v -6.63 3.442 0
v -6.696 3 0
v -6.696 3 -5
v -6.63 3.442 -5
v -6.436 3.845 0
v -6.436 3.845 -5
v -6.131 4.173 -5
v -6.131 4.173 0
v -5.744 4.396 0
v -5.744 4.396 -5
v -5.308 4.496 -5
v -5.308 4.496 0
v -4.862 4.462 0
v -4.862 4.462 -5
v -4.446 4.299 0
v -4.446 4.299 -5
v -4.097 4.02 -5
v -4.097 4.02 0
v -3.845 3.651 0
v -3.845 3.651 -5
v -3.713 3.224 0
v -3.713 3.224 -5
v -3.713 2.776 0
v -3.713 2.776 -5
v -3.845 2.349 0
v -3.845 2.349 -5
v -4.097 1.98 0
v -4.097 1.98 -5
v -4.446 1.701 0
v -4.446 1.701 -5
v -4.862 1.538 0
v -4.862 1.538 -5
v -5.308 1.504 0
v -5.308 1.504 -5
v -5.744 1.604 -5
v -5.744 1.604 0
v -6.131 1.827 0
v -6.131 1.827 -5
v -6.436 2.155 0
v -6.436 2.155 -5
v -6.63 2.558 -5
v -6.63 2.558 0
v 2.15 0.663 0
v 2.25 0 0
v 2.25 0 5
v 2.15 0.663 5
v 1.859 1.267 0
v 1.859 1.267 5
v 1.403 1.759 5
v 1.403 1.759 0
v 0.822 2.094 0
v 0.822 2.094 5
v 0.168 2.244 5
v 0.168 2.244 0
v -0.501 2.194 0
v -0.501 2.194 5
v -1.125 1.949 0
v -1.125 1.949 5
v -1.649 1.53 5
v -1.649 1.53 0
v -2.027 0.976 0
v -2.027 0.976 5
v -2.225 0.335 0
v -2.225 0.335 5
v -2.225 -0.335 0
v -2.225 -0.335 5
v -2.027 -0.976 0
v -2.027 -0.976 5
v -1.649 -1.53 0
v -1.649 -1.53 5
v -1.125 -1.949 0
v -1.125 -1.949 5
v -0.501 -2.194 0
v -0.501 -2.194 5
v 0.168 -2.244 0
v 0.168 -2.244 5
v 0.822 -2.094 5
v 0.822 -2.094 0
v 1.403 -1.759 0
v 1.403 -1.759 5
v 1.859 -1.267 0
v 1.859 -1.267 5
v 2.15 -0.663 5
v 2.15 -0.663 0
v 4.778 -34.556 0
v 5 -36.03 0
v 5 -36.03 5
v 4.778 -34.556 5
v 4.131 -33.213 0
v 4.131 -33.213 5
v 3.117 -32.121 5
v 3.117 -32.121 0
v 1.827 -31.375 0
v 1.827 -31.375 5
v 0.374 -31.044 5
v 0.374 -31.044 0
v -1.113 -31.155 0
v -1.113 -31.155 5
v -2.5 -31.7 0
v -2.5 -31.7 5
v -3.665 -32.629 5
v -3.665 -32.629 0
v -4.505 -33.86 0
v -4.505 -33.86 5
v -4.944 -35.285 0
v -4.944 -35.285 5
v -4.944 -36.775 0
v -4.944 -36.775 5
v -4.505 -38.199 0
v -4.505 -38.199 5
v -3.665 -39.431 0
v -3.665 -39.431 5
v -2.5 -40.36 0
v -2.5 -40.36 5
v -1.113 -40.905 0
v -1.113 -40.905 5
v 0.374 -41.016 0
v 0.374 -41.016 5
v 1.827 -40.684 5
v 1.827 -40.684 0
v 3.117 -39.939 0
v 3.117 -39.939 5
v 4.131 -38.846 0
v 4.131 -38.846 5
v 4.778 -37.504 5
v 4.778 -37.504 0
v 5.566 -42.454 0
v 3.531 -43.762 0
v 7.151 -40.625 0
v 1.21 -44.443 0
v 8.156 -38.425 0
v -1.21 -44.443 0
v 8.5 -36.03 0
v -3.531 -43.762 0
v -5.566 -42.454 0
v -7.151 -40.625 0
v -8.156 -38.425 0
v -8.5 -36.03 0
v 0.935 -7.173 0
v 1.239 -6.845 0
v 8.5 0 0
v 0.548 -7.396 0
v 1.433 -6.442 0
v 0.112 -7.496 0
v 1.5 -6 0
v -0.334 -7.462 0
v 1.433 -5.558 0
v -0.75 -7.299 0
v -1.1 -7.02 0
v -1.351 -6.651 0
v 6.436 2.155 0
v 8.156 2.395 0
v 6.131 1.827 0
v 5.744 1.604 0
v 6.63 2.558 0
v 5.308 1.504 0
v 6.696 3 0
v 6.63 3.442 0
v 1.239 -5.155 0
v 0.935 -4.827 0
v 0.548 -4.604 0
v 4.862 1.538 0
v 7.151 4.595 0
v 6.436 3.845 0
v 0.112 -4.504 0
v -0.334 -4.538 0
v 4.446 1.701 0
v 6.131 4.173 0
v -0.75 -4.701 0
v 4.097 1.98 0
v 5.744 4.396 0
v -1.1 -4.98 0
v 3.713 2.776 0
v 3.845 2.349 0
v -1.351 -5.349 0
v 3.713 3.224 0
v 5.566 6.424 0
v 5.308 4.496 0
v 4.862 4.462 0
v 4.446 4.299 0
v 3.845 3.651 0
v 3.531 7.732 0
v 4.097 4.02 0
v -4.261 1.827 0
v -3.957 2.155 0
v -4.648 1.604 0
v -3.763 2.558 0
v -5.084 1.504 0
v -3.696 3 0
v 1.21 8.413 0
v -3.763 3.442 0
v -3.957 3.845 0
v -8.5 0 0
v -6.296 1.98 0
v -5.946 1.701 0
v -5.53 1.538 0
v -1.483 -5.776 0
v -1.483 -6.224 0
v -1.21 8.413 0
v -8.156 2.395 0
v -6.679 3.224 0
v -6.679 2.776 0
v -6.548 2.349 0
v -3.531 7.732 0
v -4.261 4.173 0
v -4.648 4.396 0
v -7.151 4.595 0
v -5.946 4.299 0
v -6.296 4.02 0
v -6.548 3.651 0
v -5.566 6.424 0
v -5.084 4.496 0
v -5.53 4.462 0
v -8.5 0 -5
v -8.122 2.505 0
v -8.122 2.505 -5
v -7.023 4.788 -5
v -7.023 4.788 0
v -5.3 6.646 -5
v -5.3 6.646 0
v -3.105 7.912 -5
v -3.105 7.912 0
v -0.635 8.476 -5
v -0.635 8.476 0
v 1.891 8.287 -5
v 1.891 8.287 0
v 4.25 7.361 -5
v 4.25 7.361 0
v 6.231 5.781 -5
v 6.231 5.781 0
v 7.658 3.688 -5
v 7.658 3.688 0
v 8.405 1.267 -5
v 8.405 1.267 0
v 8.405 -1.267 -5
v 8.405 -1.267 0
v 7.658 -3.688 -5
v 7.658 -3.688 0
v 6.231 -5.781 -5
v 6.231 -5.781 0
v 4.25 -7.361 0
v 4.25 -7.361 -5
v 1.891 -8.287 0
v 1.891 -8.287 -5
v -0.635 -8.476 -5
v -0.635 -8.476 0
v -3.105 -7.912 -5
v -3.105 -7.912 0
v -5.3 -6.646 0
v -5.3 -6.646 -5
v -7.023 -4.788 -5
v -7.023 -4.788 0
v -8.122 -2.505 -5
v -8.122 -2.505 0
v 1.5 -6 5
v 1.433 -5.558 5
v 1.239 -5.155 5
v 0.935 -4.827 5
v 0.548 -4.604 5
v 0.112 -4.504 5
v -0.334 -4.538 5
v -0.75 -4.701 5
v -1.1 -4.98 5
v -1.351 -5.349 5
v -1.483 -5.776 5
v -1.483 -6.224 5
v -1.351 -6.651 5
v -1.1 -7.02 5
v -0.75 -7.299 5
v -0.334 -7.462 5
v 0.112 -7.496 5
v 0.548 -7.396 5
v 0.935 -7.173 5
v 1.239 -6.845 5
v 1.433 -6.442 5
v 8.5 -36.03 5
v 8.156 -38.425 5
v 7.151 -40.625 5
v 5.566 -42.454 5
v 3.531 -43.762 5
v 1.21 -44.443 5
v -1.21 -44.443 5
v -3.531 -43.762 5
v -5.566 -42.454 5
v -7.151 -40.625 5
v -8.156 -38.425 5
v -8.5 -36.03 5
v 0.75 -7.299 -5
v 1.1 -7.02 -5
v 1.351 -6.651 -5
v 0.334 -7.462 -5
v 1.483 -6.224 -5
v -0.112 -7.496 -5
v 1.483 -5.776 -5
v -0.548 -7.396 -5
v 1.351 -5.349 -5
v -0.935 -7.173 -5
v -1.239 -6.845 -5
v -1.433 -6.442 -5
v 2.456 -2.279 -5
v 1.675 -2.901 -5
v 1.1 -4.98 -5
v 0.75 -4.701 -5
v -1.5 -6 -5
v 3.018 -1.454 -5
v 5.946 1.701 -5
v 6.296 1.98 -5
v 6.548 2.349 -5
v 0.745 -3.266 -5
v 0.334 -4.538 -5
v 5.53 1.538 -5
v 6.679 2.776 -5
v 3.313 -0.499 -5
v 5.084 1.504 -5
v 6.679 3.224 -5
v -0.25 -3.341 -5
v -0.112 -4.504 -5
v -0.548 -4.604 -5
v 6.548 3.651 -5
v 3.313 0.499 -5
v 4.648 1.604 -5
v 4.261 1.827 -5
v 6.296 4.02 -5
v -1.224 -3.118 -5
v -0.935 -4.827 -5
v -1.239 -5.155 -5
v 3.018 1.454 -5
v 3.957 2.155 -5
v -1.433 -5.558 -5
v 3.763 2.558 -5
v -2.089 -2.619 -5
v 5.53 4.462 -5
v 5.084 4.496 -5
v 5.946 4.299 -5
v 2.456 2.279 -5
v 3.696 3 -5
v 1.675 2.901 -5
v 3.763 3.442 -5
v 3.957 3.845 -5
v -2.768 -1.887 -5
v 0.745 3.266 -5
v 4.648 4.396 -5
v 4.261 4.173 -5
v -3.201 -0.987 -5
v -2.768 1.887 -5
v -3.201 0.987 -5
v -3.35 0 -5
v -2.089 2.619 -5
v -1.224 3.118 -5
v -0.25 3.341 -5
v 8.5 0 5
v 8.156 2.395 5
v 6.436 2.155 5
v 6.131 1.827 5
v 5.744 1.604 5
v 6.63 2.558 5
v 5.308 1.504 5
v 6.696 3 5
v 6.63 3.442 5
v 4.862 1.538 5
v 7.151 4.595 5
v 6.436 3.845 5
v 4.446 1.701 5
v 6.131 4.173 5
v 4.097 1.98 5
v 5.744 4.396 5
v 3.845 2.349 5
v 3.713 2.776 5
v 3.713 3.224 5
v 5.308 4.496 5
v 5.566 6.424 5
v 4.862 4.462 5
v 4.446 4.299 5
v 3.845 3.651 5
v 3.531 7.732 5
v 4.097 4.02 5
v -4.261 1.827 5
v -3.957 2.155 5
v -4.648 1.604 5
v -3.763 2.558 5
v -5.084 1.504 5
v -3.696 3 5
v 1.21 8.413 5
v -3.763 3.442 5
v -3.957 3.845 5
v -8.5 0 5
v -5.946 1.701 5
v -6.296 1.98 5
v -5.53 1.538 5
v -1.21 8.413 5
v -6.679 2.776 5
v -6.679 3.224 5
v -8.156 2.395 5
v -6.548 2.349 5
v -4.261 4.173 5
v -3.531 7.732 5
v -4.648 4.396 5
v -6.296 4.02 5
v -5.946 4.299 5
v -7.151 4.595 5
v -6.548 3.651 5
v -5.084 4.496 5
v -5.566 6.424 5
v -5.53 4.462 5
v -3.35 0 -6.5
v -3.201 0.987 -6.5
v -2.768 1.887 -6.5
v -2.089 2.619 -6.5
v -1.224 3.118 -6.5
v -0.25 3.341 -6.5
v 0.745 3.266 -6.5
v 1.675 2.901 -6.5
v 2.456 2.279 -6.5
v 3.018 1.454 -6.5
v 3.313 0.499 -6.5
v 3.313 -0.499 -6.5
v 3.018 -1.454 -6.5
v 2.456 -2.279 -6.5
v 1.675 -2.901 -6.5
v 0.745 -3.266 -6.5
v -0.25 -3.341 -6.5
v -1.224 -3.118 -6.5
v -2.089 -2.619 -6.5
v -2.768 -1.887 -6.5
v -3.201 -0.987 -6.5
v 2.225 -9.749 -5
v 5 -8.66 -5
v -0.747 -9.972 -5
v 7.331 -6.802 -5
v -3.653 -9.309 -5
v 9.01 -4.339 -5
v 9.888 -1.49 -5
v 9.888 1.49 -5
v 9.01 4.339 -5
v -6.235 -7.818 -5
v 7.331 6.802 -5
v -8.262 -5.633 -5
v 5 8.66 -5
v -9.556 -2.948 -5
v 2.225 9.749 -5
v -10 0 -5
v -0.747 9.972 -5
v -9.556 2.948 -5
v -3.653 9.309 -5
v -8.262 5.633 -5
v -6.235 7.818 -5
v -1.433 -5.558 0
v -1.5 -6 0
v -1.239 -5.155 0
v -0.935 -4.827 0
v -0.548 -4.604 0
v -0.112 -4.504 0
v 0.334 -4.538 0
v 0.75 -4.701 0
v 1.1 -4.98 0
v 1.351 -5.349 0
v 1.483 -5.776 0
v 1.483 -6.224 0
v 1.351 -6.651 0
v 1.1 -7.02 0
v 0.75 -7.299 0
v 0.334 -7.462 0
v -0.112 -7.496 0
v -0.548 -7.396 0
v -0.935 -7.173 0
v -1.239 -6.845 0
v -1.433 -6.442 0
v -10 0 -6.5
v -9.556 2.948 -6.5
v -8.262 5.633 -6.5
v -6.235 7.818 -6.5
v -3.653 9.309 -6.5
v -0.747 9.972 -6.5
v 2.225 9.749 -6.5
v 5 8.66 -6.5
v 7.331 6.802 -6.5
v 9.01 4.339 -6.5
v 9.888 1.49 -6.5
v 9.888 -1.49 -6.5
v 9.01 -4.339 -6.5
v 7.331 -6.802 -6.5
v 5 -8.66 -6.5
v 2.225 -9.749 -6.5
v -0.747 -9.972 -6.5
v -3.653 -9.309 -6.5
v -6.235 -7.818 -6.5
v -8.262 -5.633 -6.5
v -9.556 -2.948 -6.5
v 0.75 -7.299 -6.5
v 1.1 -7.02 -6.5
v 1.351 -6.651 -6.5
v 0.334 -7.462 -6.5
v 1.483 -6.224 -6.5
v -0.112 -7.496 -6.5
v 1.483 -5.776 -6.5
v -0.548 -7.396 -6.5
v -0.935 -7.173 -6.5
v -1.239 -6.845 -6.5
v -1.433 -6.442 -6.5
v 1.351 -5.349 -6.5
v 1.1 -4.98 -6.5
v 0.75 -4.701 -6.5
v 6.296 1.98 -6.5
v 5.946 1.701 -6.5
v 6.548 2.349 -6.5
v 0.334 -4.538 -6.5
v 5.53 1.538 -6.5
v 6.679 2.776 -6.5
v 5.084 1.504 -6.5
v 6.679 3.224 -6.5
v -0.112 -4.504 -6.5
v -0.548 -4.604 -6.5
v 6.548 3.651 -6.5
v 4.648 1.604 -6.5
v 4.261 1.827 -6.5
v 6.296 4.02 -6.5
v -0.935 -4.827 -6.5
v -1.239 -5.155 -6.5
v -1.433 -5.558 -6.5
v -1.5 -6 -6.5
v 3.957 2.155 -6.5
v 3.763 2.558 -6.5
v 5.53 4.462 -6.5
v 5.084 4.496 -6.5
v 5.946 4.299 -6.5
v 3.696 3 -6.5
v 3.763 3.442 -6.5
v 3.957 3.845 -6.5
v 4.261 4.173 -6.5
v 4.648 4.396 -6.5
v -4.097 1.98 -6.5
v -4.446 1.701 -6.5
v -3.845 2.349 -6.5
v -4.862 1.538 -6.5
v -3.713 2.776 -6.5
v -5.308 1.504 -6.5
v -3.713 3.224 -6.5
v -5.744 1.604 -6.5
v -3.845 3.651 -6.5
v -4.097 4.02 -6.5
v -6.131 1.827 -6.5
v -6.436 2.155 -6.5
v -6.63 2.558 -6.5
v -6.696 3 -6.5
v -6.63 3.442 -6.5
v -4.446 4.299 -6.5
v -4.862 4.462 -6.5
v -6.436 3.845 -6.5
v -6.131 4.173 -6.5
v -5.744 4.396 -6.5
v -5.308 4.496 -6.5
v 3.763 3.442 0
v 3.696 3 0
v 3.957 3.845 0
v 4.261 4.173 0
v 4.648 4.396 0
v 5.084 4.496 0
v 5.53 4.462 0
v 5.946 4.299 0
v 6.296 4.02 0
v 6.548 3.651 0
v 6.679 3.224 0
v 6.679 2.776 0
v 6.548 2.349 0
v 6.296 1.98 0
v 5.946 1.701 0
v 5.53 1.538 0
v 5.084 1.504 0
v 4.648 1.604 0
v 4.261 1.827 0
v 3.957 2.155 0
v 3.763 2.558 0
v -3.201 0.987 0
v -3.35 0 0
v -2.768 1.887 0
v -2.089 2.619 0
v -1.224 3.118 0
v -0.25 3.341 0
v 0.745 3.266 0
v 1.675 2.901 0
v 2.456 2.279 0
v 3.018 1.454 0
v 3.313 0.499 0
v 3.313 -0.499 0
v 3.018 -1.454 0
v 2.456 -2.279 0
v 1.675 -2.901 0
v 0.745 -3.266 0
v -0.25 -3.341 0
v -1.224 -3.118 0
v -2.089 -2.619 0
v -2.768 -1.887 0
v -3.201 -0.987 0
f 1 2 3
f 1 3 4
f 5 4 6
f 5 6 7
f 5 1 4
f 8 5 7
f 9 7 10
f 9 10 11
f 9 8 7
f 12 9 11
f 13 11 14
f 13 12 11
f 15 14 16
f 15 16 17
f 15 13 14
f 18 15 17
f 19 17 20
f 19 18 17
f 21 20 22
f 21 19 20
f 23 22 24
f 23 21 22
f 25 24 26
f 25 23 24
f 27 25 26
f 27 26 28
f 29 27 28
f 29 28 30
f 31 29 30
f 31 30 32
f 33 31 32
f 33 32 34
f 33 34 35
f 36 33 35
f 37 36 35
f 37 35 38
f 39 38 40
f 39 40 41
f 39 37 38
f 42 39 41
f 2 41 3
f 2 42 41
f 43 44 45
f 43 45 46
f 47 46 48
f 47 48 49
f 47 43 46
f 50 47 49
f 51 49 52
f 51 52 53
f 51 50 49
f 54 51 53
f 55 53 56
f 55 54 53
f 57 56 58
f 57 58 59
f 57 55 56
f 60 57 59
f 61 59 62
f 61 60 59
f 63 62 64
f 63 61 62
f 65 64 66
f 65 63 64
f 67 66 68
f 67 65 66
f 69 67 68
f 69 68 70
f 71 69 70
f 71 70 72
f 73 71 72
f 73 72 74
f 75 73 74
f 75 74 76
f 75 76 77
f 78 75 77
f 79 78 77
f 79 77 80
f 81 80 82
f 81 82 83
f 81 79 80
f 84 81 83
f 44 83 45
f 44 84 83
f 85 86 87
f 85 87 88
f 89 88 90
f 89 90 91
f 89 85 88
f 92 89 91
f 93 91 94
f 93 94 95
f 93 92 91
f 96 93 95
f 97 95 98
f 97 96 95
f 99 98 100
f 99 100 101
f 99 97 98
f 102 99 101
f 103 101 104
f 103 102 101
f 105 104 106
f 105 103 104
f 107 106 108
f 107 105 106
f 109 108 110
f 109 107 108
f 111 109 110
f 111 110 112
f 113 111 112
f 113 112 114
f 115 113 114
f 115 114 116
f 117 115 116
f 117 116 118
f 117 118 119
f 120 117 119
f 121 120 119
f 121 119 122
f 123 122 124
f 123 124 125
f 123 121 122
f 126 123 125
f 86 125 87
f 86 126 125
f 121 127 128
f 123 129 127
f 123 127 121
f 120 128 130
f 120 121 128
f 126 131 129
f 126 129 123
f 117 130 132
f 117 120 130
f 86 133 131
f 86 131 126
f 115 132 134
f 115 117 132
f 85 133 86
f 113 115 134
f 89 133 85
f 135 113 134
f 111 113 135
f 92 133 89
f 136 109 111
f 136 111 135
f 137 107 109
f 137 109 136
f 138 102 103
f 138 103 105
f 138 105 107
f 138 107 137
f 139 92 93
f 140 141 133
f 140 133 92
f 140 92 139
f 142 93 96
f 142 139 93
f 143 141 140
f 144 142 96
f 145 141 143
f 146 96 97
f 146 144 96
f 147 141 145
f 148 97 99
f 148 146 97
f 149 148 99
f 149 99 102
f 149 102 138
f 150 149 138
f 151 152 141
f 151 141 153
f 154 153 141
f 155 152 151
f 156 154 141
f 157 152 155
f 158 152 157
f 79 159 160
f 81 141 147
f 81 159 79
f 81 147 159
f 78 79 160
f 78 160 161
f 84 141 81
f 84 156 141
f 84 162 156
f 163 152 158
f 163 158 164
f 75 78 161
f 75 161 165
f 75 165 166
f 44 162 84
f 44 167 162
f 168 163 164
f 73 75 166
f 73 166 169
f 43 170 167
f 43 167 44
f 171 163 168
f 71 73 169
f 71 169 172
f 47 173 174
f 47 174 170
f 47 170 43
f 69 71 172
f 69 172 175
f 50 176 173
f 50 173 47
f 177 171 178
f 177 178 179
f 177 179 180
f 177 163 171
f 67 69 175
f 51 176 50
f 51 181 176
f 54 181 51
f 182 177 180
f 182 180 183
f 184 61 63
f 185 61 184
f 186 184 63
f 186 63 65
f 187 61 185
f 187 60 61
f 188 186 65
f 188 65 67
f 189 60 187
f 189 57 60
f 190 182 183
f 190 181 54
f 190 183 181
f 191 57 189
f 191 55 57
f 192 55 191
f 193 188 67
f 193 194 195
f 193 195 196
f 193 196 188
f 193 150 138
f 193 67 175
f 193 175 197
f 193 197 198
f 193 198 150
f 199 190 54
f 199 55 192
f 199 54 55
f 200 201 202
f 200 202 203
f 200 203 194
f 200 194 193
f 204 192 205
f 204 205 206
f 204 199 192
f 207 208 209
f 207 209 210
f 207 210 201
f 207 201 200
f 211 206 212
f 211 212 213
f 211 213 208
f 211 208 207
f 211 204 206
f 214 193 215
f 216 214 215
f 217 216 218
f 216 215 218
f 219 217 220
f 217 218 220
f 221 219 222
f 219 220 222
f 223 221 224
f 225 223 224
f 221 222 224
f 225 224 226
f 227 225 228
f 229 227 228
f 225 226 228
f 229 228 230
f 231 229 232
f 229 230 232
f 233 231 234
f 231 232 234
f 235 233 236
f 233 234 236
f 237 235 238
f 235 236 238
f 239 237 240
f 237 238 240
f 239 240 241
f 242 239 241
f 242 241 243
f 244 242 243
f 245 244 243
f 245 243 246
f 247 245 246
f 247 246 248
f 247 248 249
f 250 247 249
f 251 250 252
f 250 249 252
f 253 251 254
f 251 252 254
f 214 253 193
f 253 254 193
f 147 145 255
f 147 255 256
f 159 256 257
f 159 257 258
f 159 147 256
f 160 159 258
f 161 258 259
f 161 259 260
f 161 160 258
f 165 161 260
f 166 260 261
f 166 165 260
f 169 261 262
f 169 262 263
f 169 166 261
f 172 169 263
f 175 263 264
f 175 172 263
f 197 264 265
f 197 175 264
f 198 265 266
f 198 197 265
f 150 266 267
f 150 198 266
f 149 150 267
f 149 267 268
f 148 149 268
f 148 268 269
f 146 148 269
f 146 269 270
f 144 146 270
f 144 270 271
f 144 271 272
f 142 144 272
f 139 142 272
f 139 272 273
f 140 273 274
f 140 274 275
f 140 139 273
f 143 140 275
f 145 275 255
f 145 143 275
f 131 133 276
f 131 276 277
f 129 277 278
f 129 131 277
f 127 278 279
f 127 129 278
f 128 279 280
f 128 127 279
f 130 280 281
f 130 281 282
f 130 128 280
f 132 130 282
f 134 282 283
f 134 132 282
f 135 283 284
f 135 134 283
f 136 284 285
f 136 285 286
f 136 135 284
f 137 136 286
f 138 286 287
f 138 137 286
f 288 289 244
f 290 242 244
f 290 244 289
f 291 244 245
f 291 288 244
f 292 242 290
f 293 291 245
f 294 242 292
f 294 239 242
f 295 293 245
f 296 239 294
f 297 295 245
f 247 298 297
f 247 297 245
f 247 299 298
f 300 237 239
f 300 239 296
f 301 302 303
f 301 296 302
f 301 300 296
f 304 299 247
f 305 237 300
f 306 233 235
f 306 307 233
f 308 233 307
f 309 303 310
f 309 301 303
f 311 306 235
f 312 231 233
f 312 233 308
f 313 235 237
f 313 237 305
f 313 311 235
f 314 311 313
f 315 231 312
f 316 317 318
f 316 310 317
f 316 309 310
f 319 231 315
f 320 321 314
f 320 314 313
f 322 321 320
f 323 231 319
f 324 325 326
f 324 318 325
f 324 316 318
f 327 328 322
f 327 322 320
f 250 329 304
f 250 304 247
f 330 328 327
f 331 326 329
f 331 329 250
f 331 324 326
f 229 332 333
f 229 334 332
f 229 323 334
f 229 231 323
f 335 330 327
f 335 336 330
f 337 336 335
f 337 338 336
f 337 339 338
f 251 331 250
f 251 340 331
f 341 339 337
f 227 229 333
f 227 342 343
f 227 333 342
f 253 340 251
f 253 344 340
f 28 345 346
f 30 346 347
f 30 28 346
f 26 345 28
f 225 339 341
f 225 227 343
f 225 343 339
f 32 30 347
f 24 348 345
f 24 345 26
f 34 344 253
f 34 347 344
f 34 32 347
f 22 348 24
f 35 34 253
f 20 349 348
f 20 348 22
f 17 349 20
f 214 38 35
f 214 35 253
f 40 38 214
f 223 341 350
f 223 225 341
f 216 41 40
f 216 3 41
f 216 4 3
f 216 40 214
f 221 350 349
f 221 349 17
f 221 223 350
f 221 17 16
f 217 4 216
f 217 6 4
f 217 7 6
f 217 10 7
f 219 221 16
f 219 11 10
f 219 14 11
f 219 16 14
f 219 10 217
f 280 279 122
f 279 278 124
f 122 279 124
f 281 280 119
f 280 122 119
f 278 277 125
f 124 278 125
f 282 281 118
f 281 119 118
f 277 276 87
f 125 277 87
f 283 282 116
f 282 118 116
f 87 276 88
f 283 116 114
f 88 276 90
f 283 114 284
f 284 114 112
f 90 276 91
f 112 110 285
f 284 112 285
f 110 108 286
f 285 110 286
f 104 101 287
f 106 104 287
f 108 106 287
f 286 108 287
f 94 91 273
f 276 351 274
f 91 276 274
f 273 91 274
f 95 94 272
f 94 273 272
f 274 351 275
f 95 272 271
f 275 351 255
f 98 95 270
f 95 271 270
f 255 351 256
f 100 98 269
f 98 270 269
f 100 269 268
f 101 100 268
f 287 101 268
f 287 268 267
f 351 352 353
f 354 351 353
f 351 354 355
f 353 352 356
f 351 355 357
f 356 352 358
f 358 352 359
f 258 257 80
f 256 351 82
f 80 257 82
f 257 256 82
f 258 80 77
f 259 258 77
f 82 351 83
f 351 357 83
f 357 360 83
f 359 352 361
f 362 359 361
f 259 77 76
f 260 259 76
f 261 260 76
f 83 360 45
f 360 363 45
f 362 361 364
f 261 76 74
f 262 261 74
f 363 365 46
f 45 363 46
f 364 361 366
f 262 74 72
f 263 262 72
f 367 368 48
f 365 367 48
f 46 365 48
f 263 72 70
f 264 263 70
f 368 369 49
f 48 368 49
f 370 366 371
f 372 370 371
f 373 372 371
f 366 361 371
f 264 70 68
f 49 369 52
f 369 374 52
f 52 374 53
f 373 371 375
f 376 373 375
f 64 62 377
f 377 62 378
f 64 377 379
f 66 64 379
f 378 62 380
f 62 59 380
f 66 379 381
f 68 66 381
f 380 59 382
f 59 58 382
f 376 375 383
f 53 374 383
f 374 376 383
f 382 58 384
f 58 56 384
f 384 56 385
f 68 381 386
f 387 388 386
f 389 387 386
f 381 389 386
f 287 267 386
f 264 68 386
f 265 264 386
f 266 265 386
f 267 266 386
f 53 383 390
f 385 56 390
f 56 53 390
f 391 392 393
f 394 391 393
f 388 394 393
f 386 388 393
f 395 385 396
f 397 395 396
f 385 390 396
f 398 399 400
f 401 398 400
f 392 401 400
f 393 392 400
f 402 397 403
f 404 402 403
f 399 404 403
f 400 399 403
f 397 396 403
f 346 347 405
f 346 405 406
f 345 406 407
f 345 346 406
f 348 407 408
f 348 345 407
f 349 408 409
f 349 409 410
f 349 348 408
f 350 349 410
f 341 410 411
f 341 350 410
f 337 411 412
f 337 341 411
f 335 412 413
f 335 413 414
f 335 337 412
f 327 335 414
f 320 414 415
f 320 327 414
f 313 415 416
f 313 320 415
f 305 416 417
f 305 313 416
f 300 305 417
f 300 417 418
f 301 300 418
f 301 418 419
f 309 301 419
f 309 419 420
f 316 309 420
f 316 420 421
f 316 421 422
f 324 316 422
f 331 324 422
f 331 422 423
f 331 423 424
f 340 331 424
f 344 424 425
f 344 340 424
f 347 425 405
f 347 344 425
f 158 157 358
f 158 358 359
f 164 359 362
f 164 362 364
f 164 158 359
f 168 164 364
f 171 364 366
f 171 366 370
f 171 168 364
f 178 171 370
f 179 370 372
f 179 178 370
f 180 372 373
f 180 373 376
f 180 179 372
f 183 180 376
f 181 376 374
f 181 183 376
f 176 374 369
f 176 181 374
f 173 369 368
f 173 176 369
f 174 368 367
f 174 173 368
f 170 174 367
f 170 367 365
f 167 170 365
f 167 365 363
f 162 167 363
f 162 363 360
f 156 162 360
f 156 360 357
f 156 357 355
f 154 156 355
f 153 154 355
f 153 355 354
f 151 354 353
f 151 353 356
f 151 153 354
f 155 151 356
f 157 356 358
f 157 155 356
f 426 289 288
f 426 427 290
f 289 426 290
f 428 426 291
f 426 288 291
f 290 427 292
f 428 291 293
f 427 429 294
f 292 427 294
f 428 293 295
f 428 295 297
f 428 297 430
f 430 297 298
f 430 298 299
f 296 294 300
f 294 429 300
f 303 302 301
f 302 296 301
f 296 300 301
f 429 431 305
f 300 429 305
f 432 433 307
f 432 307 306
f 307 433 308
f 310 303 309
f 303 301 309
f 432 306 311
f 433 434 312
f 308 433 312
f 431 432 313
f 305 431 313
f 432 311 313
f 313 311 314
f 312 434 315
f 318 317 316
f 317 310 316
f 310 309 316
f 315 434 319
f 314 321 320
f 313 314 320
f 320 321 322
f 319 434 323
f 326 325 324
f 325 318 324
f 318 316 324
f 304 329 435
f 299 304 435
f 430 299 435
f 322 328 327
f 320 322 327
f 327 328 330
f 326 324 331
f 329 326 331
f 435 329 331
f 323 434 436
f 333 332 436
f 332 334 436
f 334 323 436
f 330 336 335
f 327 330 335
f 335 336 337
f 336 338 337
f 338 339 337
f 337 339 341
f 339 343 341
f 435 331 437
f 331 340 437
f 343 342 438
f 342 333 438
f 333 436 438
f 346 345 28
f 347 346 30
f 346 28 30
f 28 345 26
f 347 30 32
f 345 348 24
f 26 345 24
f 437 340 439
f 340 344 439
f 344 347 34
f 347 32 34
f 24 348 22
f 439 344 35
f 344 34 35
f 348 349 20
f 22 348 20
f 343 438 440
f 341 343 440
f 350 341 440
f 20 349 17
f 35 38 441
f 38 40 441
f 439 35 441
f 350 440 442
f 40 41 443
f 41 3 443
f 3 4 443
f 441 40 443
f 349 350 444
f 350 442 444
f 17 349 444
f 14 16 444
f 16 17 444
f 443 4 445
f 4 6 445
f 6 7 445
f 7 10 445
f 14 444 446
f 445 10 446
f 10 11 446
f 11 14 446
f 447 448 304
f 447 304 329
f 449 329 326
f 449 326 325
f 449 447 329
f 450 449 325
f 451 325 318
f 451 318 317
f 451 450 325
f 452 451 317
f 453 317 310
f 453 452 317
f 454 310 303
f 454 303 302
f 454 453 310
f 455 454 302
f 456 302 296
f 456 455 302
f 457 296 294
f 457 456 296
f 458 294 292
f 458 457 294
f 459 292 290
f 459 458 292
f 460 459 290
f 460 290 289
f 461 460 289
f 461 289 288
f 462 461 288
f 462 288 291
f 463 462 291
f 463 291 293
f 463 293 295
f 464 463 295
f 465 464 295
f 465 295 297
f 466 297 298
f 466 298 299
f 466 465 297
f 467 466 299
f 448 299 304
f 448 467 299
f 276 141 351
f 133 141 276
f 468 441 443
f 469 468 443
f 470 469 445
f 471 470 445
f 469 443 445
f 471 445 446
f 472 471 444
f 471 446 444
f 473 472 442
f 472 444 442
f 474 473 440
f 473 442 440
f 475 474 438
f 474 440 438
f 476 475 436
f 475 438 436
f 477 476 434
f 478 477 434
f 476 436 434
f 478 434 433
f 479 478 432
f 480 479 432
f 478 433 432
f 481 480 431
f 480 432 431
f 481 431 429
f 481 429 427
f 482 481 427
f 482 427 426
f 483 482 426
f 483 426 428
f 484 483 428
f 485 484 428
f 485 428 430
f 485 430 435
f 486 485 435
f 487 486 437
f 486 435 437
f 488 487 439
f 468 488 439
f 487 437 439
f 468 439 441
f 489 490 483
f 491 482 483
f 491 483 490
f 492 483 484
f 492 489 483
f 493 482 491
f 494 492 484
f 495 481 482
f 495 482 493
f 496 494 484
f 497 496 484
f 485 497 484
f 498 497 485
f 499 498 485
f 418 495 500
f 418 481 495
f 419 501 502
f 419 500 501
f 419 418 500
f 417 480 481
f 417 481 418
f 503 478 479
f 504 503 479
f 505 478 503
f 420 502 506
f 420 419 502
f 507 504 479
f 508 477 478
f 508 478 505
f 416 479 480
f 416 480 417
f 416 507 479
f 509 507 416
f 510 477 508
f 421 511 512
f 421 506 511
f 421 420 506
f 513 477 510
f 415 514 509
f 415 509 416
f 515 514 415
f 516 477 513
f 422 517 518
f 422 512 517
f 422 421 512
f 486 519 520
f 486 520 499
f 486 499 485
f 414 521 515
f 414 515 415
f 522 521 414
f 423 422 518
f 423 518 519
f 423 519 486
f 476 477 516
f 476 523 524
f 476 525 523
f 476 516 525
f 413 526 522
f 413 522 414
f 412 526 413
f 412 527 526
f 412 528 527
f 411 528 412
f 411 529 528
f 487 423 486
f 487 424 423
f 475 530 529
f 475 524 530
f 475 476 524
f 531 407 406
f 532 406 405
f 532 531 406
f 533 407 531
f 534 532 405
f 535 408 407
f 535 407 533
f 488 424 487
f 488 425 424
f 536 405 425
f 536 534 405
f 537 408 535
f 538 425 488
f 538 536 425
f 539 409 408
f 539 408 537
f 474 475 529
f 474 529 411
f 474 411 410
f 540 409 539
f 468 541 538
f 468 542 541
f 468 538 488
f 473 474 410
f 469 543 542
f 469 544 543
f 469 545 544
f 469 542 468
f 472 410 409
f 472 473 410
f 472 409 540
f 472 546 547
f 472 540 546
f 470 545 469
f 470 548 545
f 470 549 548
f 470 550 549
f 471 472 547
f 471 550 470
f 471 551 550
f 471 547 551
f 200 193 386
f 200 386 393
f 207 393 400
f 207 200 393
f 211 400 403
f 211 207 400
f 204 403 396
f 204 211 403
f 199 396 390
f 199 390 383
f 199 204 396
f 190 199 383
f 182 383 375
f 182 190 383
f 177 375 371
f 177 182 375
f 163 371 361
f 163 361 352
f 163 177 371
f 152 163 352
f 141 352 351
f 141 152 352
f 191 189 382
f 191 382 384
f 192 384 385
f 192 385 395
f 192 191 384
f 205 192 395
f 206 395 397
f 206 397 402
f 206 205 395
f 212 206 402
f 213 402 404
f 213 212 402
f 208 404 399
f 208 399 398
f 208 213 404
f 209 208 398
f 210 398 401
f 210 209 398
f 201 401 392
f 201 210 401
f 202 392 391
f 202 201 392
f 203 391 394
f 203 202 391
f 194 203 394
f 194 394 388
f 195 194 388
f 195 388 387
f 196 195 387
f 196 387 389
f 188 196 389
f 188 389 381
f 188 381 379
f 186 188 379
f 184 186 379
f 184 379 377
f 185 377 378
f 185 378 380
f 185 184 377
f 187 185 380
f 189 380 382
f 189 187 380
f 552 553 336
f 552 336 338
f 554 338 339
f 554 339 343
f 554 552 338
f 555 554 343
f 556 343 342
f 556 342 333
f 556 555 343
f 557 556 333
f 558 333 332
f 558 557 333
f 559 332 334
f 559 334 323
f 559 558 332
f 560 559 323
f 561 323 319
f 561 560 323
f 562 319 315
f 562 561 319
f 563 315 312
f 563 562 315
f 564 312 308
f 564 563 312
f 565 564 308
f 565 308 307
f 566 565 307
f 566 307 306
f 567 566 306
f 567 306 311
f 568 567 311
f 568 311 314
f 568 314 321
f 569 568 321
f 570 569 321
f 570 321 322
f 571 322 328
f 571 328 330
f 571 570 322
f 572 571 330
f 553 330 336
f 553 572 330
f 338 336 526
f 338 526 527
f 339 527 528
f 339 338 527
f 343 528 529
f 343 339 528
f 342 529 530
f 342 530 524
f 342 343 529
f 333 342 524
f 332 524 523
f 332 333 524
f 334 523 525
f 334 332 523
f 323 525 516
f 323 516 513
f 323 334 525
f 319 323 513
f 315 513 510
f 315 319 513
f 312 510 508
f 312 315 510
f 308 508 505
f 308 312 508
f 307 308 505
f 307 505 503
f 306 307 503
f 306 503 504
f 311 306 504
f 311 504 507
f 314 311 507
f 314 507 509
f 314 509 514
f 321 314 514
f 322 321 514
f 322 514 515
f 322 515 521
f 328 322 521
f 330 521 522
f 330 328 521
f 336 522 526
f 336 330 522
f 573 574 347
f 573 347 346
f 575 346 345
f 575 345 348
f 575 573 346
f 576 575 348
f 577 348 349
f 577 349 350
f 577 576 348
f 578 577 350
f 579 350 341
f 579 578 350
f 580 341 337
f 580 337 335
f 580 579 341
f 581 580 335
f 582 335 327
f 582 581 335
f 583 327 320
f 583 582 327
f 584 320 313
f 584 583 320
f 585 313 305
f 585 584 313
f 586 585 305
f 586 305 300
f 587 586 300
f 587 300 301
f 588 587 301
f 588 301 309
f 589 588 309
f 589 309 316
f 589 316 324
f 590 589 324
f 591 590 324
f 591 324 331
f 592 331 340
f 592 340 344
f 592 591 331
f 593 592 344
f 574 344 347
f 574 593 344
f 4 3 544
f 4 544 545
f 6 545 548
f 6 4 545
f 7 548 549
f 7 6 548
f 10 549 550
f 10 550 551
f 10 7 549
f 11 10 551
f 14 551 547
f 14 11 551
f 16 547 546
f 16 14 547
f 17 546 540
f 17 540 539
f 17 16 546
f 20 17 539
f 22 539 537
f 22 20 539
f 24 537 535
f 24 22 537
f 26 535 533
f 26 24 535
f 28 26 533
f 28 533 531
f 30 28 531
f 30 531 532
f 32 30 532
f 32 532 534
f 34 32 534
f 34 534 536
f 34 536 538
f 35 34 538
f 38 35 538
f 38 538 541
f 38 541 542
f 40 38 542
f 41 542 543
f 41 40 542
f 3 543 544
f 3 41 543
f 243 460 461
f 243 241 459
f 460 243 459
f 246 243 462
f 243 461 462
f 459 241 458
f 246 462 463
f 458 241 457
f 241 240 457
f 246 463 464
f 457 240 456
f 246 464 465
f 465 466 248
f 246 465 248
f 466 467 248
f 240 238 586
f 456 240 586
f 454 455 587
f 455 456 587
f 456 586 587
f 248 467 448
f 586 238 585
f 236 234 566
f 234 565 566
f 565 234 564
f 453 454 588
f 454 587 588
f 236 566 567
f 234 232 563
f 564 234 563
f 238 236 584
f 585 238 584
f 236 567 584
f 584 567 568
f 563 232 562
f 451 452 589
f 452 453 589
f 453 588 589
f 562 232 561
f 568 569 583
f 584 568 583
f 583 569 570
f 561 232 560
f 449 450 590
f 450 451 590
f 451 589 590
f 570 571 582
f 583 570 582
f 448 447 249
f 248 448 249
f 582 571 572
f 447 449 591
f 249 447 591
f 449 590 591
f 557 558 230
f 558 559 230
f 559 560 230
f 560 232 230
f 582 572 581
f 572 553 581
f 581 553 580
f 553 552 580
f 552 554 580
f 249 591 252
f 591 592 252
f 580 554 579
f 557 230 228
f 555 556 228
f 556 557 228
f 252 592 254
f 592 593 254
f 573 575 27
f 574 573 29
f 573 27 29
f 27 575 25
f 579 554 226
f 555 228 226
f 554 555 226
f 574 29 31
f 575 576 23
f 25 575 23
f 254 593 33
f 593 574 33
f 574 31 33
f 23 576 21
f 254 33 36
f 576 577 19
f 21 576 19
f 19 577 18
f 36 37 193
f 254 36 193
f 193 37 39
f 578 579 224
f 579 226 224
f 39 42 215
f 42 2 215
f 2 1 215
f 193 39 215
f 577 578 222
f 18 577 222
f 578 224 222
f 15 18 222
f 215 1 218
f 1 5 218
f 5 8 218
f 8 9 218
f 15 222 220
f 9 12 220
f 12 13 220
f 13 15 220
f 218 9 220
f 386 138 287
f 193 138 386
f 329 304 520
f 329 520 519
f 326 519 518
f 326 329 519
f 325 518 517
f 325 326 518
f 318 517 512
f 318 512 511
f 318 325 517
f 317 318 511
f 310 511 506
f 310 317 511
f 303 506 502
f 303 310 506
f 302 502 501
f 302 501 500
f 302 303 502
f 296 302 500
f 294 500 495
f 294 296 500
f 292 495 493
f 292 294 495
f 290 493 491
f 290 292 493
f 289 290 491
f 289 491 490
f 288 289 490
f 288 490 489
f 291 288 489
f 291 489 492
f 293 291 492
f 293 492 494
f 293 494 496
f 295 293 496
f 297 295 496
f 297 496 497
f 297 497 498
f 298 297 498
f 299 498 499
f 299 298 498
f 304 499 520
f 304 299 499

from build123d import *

# Parameters (mm, degrees)
SKETCH_1_R      = 1.5
SKETCH_1_R_2    = 2.25
SKETCH_1_R_3    = 5
EXTRUDE_1_DEPTH = 5
SKETCH_2_R      = 8.5
SKETCH_2_R_2    = 1.5
SKETCH_2_R_3    = 3.35
EXTRUDE_2_DEPTH = 5
SKETCH_3_R      = 10
SKETCH_3_R_2    = 1.5
SKETCH_3_R_3    = 3.35
EXTRUDE_3_DEPTH = 1.5


with BuildPart() as part:
    # 草图1 → 凸台-拉伸1 (new body)
    with BuildSketch(Plane.XY):
        with BuildLine():
            Line((-8.5, -36.02986797), (-8.5, 0))
            ThreePointArc((-8.5, 0), (0, 8.5), (8.5, 0))
            Line((8.5, 0), (8.5, -36.02986797))
            ThreePointArc((8.5, -36.02986797), (0, -44.52986797), (-8.5, -36.02986797))
        make_face()
        with Locations((-5.196152423, 3)):
            Circle(SKETCH_1_R, mode=Mode.SUBTRACT)
        Circle(SKETCH_1_R_2, mode=Mode.SUBTRACT)
        with Locations((0, -36.02986797)):
            Circle(SKETCH_1_R_3, mode=Mode.SUBTRACT)
        with Locations((5.196152423, 3)):
            Circle(SKETCH_1_R, mode=Mode.SUBTRACT)
        with Locations((0, -6)):
            Circle(SKETCH_1_R, mode=Mode.SUBTRACT)
    extrude(amount=EXTRUDE_1_DEPTH)


with BuildPart() as body_2:
    # 草图2 → 凸台-拉伸2 (new body)
    with BuildSketch(Plane(origin=(0, 0, 0), x_dir=(-1, 0, 0), z_dir=(0, 0, -1))):
        Circle(SKETCH_2_R)
        with Locations((0, -6)):
            Circle(SKETCH_2_R_2, mode=Mode.SUBTRACT)
        with Locations((5.196152423, 3)):
            Circle(SKETCH_2_R_2, mode=Mode.SUBTRACT)
        Circle(SKETCH_2_R_3, mode=Mode.SUBTRACT)
        with Locations((-5.196152423, 3)):
            Circle(SKETCH_2_R_2, mode=Mode.SUBTRACT)
    extrude(amount=EXTRUDE_2_DEPTH)


with BuildPart() as body_3:
    # 草图3 → 凸台-拉伸3 (new body)
    with BuildSketch(Plane(origin=(0, 0, -5), x_dir=(-1, 0, 0), z_dir=(0, 0, -1))):
        Circle(SKETCH_3_R)
        with Locations((-5.196152423, 3)):
            Circle(SKETCH_3_R_2, mode=Mode.SUBTRACT)
        Circle(SKETCH_3_R_3, mode=Mode.SUBTRACT)
        with Locations((5.196152423, 3)):
            Circle(SKETCH_3_R_2, mode=Mode.SUBTRACT)
        with Locations((0, -6)):
            Circle(SKETCH_3_R_2, mode=Mode.SUBTRACT)
    extrude(amount=EXTRUDE_3_DEPTH)


solid = Compound([part.part, body_2.part, body_3.part])
